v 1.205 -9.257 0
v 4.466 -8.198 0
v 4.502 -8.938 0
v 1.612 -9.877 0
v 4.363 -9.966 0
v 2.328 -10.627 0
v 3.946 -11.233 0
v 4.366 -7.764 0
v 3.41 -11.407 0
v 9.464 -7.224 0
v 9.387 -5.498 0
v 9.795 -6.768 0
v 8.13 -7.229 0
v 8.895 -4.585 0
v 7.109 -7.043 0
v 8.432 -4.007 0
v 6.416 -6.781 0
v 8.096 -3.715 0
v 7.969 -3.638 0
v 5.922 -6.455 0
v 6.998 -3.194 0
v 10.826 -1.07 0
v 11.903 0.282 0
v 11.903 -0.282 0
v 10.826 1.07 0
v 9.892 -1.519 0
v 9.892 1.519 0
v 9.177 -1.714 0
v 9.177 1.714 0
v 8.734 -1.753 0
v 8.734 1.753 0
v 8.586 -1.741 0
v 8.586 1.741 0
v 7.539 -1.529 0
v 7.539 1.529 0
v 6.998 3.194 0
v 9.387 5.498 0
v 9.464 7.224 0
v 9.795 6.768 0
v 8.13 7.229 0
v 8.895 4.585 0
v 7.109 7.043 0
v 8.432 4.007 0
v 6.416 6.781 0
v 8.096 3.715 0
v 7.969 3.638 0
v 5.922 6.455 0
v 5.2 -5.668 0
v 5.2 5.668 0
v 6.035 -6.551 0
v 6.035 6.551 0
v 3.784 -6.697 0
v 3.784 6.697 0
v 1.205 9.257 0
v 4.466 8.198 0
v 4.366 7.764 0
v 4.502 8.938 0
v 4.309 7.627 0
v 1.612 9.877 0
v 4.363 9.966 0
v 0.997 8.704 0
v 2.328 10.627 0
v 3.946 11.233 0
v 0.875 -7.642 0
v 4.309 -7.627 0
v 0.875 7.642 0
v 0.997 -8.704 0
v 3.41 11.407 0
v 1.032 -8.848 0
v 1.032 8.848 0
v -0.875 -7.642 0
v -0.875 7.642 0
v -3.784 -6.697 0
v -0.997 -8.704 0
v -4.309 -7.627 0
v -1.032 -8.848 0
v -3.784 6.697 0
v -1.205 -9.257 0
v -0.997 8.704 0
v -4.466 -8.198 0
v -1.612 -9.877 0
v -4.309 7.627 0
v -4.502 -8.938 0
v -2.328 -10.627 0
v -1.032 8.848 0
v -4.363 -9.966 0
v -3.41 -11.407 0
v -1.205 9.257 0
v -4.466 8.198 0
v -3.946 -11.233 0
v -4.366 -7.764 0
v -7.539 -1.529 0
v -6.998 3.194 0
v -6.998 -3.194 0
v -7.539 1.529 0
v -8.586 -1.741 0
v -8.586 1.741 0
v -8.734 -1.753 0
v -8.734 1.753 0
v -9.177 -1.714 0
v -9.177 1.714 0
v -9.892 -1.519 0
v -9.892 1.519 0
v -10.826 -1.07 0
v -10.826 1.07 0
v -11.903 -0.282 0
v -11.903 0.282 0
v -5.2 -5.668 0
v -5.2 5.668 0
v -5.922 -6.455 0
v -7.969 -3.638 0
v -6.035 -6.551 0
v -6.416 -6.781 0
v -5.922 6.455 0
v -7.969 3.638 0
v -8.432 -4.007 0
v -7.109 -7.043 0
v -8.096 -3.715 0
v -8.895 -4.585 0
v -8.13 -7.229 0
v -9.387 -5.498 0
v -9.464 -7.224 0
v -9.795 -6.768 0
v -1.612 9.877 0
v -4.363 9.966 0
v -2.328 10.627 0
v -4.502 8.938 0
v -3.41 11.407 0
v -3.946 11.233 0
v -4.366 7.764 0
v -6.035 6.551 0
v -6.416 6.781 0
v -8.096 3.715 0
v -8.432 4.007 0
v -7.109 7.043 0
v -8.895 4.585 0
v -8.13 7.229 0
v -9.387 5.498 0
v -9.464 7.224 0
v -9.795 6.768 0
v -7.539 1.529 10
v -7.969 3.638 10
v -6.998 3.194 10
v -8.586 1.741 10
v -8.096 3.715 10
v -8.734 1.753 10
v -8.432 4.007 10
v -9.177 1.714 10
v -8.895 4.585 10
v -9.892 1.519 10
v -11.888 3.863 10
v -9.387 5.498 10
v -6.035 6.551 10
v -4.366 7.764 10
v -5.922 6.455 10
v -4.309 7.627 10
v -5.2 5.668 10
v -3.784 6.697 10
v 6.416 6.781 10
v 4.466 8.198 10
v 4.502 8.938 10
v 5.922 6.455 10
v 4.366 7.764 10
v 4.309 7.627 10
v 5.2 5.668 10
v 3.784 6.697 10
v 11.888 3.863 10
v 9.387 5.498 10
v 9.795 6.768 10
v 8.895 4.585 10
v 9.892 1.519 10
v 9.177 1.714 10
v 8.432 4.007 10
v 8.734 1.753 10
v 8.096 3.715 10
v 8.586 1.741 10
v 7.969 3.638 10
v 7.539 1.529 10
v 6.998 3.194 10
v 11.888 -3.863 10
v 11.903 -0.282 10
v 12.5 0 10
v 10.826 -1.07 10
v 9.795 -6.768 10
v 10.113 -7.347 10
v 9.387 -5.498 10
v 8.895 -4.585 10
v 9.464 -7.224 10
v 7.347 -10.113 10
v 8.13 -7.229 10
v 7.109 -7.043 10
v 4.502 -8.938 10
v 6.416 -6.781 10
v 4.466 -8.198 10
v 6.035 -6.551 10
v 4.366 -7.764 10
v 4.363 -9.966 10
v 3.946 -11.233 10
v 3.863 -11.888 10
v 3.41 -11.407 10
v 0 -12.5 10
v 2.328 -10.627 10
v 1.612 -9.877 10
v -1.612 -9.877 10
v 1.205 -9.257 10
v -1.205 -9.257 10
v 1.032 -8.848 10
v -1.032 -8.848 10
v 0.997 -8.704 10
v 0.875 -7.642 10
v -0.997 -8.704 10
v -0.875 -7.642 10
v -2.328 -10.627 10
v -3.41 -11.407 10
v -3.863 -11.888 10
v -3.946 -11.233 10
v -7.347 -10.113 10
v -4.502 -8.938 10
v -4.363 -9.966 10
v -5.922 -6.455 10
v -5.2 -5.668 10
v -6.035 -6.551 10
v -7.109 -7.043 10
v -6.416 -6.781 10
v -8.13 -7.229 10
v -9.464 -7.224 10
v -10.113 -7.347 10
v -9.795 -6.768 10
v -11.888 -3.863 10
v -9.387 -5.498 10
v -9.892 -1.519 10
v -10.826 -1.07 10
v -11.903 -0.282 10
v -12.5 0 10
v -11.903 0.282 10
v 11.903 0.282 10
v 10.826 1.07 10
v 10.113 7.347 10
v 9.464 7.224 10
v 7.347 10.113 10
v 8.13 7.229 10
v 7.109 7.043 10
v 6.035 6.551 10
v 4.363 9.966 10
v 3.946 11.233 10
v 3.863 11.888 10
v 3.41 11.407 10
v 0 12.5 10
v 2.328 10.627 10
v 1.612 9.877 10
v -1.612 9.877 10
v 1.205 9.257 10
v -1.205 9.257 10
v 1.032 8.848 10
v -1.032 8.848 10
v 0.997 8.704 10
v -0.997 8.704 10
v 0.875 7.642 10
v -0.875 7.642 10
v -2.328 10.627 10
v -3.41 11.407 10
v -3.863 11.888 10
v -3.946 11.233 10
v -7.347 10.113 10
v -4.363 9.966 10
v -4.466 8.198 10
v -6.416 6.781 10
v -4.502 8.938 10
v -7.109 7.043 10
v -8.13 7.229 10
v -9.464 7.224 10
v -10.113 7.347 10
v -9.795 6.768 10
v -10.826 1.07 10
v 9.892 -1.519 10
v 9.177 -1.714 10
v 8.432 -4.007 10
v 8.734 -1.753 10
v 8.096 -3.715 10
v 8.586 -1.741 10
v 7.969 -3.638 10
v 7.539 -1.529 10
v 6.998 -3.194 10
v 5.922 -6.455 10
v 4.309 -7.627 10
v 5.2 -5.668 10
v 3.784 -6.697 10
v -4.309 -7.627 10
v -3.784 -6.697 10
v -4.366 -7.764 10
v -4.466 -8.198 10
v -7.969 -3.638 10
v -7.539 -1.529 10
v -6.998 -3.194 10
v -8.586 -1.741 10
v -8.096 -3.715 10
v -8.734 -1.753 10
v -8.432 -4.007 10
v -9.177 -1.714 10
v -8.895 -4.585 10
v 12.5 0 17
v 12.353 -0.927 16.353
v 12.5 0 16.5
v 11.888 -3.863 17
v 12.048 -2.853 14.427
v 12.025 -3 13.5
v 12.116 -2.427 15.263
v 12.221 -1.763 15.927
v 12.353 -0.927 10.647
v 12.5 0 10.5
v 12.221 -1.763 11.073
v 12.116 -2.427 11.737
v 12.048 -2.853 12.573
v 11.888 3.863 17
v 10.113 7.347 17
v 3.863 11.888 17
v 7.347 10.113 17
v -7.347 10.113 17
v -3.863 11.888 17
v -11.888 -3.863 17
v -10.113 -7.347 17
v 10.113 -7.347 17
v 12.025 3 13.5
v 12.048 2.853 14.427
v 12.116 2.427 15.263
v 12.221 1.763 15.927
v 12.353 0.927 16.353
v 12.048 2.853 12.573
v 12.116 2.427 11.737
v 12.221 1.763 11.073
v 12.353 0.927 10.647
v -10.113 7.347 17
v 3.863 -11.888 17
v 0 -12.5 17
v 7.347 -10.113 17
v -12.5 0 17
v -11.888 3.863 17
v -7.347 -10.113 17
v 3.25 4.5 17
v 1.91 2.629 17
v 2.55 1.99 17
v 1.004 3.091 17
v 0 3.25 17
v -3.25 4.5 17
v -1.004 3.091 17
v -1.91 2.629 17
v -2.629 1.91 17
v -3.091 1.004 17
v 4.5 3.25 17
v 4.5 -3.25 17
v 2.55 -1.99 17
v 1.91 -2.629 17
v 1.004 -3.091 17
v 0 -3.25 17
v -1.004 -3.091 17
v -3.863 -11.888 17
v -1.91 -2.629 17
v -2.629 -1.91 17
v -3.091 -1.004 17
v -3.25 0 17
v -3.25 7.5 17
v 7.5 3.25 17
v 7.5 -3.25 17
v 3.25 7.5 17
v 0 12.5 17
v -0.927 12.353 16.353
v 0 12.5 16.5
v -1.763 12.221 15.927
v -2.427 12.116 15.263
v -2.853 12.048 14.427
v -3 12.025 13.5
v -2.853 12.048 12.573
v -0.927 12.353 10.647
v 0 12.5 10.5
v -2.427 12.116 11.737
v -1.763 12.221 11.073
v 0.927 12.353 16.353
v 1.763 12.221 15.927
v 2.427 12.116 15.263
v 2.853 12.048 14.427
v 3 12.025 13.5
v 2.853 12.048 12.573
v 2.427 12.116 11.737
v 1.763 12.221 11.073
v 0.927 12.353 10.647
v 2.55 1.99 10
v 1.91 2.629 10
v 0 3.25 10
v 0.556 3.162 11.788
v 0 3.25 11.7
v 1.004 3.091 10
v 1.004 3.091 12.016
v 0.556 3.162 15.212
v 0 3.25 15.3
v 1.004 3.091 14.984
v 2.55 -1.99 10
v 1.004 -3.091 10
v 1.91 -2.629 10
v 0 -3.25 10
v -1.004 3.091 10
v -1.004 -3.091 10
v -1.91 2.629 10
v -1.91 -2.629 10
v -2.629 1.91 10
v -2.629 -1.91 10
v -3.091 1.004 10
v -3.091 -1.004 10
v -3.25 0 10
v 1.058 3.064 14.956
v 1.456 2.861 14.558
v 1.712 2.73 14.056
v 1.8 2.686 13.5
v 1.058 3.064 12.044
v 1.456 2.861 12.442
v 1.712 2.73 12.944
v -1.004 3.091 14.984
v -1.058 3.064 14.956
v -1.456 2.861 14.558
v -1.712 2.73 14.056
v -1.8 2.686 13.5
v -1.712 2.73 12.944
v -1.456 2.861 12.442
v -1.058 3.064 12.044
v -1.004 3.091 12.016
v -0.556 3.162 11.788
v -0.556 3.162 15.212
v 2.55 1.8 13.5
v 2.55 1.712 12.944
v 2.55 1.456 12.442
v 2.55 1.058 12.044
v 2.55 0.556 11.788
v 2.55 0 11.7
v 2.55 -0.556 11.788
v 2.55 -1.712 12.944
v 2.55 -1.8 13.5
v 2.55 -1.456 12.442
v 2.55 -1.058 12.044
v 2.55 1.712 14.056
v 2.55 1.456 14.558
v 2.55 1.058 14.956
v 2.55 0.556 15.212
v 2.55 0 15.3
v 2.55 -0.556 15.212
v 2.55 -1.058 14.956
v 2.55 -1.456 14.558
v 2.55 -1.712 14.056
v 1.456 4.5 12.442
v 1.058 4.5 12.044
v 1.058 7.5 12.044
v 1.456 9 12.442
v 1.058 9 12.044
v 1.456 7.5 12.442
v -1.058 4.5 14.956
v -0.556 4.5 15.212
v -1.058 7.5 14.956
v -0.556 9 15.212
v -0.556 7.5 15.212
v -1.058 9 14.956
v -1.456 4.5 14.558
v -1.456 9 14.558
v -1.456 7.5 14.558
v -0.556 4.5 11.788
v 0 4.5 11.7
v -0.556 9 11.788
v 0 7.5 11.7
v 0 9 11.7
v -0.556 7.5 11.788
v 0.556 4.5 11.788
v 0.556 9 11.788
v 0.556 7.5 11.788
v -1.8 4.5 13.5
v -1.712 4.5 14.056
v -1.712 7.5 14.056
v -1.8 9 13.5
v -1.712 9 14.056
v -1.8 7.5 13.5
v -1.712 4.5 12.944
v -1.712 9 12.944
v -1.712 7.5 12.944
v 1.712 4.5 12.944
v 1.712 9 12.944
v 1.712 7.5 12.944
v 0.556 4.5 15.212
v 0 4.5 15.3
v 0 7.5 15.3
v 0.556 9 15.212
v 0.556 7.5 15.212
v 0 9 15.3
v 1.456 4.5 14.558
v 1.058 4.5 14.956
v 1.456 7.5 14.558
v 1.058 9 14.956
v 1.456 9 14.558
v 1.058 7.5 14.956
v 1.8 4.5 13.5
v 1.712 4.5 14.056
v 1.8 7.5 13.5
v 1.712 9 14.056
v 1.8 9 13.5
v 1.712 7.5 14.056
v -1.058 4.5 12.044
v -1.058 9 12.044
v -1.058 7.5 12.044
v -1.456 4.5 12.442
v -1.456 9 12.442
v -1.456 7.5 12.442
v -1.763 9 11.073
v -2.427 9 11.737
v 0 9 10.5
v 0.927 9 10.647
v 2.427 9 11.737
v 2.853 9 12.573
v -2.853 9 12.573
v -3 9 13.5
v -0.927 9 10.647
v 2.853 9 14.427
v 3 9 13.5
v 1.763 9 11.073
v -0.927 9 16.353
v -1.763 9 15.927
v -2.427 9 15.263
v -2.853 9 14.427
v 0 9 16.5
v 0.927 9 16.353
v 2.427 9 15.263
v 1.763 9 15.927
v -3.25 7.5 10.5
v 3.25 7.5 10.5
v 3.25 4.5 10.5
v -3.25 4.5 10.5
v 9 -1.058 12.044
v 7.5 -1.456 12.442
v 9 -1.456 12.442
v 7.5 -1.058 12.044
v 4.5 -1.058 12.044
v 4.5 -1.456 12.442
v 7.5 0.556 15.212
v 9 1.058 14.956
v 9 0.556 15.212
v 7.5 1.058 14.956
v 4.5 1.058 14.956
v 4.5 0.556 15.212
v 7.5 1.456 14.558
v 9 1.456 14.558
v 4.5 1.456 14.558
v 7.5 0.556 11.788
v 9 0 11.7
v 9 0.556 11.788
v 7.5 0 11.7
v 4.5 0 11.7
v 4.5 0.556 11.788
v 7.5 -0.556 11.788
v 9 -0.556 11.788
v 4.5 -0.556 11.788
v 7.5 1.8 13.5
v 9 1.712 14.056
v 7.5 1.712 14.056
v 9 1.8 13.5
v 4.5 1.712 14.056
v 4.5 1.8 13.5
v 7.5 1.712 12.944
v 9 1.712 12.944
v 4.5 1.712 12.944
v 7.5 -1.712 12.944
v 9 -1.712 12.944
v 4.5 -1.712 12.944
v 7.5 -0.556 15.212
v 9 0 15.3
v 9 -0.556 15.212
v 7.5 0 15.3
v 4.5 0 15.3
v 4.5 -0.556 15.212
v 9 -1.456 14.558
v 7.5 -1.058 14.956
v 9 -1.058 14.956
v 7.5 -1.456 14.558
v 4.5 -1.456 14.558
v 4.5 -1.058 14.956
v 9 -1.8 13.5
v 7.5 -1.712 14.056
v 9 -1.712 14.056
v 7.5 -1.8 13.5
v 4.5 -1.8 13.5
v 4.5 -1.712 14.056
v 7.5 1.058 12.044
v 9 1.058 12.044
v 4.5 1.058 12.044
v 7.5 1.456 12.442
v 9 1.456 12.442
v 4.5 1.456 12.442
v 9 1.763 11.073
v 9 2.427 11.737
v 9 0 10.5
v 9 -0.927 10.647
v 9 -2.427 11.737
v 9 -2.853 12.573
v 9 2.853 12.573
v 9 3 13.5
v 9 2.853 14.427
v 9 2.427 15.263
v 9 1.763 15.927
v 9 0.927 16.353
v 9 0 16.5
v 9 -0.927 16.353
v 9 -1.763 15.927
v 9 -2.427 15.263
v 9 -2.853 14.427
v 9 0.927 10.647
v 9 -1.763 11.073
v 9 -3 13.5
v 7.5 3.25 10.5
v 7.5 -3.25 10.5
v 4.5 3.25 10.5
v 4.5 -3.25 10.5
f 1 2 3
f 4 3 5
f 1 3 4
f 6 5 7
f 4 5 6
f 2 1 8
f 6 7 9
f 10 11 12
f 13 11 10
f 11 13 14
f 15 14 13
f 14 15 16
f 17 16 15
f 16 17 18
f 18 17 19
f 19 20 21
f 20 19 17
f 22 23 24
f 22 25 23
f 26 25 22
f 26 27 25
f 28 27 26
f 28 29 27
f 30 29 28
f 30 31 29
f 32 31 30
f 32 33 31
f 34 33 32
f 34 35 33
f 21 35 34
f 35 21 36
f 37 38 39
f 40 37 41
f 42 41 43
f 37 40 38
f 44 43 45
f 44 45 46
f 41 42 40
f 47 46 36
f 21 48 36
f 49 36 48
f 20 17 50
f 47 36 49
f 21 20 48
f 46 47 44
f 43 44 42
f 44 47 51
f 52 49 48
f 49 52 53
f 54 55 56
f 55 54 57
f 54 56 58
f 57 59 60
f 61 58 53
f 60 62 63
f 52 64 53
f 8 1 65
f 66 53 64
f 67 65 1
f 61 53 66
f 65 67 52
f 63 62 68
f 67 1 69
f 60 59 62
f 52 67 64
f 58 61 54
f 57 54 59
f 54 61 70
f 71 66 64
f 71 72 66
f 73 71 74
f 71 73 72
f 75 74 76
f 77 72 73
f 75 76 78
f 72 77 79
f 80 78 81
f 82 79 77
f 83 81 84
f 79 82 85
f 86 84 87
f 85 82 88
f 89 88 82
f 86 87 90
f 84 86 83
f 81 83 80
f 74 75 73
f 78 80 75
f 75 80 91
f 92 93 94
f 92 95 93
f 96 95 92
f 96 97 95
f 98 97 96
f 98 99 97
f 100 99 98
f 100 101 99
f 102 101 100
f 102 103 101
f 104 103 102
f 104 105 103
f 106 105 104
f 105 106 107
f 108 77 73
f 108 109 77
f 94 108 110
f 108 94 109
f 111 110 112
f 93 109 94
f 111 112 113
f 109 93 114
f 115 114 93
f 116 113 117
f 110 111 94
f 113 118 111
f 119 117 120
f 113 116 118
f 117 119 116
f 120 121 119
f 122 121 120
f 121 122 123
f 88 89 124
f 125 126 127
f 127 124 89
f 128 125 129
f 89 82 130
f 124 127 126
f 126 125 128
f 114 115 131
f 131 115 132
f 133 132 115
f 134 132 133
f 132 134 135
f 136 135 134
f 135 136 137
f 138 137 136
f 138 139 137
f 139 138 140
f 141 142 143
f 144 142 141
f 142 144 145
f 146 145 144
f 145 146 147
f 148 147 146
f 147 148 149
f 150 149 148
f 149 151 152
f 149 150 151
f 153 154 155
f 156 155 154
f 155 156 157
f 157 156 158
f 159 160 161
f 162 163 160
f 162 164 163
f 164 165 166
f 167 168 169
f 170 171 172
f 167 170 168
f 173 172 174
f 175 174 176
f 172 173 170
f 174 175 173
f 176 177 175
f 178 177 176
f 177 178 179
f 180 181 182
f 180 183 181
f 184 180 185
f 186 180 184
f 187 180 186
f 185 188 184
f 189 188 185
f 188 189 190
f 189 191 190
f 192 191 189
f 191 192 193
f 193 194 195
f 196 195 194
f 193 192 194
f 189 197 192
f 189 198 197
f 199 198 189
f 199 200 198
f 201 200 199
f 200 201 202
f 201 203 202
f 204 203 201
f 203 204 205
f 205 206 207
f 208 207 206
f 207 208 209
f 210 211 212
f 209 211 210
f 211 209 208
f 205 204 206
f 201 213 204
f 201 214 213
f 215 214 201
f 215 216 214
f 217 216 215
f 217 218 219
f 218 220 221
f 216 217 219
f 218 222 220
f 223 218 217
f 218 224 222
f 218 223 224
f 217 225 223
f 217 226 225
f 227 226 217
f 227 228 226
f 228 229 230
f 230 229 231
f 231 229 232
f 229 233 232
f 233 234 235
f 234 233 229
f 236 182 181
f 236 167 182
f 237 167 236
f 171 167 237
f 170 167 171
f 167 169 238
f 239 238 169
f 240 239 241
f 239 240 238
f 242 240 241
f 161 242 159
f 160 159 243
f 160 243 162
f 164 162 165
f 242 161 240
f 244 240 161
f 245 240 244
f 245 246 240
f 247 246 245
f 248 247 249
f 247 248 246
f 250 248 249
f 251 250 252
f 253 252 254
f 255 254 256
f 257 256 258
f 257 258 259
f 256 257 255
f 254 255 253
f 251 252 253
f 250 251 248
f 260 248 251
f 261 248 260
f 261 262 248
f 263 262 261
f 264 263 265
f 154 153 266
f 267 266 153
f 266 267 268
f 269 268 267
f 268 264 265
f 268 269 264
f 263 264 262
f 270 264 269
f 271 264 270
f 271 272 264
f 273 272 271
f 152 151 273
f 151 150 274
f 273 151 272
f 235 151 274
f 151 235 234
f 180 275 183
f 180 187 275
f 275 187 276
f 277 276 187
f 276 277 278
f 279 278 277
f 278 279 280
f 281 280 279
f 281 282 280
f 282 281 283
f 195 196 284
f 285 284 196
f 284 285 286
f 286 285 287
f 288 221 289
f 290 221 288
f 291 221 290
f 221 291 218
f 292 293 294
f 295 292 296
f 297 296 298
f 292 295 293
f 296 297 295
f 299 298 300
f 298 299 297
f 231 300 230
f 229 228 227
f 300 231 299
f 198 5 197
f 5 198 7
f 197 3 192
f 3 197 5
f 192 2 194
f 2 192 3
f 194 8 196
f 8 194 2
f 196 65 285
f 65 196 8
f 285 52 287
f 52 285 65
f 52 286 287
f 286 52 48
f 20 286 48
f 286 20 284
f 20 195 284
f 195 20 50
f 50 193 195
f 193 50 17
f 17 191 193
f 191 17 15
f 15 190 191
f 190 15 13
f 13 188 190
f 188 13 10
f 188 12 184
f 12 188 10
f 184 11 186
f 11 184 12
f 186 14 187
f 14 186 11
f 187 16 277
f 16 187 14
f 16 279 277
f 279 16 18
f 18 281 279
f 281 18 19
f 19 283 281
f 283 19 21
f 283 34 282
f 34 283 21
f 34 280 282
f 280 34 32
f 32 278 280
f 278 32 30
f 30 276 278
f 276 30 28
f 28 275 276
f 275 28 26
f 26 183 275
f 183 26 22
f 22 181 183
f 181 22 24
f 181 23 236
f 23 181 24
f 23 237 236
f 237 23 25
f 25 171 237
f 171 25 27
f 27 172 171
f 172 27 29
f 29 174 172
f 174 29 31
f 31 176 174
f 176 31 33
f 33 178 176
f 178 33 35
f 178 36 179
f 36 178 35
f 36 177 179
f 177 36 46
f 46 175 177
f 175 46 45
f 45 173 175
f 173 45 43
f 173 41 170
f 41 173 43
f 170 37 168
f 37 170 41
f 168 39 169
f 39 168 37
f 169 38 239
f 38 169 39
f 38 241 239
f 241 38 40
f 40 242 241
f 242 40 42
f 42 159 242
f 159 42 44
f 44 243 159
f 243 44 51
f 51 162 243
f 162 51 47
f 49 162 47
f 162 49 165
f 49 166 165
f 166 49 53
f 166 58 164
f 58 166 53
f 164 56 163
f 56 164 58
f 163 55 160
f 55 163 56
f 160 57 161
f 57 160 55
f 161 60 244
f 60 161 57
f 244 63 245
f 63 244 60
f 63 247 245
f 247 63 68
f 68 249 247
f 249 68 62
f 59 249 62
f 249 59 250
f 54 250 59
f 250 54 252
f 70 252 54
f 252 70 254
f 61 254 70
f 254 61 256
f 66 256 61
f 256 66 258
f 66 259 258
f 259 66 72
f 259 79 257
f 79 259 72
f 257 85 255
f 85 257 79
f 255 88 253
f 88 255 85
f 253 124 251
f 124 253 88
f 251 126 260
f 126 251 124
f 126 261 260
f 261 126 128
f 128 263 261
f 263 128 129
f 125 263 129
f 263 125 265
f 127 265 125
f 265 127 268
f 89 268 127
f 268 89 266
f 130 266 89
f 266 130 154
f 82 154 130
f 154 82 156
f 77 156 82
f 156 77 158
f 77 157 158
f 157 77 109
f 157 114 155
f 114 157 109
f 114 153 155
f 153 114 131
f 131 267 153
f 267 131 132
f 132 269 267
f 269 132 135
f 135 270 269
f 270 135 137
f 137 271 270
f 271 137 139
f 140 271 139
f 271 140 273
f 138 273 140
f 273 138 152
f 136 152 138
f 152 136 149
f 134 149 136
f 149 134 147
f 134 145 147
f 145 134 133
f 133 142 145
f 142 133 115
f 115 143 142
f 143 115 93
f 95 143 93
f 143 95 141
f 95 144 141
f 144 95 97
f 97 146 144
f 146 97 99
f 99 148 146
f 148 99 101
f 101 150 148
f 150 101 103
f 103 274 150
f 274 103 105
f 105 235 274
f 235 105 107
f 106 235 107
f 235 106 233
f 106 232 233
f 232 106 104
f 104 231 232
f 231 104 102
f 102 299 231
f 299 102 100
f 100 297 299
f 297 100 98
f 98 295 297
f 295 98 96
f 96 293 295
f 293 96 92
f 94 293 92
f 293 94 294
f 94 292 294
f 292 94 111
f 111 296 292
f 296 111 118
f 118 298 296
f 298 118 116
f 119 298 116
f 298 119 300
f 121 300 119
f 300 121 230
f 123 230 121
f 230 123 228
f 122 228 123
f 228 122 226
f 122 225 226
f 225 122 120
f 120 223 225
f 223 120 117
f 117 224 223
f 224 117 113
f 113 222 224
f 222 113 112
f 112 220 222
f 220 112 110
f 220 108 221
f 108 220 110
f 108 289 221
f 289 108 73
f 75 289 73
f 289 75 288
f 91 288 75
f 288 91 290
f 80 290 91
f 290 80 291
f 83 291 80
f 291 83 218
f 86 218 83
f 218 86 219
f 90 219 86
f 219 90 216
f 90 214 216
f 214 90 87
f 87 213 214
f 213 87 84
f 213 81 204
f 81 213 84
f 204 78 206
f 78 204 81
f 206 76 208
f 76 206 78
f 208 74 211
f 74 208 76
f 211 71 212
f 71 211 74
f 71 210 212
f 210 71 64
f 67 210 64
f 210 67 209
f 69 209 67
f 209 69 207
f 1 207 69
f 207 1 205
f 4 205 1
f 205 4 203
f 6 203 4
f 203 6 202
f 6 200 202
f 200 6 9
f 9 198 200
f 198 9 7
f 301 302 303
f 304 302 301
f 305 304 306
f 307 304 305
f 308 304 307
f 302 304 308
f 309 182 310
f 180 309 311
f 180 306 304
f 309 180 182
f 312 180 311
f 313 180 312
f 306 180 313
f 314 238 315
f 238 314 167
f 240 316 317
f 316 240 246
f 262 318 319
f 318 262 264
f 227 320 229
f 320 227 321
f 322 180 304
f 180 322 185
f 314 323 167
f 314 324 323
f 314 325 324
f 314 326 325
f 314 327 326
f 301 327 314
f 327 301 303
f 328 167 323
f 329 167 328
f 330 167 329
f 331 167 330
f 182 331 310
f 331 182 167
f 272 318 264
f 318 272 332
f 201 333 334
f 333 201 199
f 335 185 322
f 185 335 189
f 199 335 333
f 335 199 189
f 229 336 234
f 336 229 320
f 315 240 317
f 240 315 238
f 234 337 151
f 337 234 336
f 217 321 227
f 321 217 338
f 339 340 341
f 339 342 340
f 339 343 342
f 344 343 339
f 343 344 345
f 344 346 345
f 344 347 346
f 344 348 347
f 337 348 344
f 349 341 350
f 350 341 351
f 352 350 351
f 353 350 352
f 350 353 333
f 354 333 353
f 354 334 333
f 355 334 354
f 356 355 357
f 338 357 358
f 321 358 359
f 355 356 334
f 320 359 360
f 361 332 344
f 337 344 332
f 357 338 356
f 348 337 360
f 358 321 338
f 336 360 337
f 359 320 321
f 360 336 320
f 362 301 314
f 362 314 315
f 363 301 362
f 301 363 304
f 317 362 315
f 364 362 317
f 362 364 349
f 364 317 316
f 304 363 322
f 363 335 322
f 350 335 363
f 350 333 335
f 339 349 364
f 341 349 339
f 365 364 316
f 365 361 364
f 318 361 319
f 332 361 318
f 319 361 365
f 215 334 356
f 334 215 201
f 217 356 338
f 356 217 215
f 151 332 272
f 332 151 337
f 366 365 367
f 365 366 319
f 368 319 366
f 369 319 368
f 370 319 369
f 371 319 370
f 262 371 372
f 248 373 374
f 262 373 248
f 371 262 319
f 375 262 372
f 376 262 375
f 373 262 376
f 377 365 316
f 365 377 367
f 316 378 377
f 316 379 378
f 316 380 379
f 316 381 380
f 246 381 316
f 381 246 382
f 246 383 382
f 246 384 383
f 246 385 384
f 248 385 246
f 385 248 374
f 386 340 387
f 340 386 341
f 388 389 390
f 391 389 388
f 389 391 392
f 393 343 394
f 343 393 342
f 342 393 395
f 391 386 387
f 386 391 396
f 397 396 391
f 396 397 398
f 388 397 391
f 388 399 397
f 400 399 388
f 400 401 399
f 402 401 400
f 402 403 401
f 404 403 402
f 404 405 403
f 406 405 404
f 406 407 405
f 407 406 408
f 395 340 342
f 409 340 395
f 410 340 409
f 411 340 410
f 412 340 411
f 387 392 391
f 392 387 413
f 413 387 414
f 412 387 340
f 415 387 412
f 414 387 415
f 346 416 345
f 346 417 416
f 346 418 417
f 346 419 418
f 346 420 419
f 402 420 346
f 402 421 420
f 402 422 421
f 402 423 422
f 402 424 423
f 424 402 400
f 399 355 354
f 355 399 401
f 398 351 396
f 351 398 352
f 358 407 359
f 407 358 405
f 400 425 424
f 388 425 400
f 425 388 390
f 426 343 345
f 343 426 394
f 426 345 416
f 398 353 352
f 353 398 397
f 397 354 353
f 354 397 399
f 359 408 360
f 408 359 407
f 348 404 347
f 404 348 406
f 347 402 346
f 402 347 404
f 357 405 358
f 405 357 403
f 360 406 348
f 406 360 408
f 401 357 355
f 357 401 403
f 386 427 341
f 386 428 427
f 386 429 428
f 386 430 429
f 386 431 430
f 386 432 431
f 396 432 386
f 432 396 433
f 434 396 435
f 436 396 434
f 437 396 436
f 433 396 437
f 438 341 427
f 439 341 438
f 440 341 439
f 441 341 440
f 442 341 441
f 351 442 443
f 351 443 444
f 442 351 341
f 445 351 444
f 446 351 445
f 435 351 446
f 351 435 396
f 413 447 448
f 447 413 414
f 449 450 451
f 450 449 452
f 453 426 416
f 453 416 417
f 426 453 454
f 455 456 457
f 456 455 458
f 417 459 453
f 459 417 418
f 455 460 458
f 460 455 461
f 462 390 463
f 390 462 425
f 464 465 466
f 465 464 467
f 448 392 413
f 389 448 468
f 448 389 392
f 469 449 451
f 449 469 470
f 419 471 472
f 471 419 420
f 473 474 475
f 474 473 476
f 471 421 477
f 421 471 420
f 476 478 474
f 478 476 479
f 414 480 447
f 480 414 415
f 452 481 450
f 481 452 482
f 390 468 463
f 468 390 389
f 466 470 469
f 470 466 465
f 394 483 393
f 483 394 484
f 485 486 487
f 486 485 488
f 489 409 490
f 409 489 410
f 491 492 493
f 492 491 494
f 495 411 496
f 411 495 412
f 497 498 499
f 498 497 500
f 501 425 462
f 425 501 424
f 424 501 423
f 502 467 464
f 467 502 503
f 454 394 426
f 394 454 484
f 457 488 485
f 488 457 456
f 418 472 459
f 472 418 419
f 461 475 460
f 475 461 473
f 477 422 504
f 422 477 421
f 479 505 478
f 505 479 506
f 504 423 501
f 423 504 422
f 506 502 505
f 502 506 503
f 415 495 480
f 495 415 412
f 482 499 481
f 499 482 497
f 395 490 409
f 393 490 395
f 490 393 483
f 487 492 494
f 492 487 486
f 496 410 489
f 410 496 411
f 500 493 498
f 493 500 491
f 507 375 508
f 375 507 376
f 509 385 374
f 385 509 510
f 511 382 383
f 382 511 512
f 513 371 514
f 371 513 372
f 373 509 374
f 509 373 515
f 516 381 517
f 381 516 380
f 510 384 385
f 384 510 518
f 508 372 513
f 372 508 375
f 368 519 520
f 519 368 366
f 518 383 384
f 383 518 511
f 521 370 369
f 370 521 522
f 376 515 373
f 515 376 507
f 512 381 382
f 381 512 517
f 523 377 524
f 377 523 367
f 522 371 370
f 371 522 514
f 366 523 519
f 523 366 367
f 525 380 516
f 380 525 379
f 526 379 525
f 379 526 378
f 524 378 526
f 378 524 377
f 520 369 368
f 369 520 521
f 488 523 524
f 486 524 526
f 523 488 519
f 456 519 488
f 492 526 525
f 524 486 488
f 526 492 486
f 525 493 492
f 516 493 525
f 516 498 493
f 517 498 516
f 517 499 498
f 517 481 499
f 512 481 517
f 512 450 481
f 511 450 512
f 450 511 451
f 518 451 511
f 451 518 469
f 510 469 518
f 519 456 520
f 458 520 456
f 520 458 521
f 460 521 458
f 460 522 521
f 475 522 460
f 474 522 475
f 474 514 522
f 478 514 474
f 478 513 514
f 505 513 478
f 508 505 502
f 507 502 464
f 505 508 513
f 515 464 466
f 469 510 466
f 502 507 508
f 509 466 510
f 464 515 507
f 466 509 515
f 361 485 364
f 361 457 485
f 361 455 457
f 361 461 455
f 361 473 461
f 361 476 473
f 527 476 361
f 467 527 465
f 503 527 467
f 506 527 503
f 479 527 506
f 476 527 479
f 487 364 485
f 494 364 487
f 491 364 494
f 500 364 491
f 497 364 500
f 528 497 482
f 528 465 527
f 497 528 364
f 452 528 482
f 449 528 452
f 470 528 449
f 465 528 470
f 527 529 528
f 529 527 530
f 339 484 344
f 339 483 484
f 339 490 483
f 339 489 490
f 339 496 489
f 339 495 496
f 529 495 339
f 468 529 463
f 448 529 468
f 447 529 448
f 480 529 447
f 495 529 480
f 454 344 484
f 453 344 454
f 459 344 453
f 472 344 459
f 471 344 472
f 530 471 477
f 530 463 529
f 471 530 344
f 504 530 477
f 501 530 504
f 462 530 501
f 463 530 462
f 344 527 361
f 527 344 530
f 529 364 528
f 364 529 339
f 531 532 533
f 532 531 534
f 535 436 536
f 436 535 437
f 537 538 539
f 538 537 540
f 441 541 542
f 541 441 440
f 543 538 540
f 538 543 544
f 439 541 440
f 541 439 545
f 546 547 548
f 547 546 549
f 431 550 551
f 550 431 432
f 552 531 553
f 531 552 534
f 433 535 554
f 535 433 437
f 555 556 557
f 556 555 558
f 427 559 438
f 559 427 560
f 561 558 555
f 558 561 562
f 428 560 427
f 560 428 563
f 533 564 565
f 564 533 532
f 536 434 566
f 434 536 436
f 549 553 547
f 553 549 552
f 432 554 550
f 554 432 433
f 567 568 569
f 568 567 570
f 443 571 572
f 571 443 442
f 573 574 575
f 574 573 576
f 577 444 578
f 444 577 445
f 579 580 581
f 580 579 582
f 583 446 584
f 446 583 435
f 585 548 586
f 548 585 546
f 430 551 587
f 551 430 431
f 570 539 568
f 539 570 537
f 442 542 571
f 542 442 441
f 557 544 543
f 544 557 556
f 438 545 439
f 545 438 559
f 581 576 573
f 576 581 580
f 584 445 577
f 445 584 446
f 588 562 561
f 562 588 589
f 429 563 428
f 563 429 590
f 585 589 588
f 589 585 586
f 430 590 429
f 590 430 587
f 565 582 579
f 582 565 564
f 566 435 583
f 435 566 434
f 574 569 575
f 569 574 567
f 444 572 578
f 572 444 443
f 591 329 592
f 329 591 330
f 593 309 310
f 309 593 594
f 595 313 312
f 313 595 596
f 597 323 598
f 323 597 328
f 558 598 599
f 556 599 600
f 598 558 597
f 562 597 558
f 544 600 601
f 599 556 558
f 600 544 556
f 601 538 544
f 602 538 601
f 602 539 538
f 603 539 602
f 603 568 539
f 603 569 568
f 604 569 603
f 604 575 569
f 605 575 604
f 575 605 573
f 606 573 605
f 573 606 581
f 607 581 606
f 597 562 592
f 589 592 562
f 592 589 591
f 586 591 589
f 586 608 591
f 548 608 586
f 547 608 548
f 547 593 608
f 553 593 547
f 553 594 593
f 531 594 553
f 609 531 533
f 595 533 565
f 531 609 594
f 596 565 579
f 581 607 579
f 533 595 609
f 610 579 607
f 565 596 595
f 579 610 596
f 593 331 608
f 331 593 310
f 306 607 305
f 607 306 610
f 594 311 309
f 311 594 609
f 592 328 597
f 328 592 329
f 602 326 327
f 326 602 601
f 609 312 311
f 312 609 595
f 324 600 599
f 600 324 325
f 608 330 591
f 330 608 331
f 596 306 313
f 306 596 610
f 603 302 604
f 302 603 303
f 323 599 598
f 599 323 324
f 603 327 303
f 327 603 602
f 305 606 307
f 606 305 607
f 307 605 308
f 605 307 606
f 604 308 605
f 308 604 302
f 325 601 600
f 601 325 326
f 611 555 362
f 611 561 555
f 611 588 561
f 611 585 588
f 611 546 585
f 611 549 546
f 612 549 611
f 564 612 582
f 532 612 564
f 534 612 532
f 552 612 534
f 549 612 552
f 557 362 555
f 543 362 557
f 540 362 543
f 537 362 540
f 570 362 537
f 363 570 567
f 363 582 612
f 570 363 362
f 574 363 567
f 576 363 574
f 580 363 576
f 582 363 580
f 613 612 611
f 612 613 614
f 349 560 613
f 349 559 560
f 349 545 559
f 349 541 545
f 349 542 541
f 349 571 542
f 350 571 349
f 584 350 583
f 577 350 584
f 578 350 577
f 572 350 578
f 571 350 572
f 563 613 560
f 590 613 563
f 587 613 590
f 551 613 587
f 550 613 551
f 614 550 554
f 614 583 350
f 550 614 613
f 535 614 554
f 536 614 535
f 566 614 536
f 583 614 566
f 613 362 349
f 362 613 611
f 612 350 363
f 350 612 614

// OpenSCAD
// file: 12vmotor.scad
module dshaft(d = 6, dee = 0.7, h = 5.8){
    difference() {
    cylinder(r=d/2, h=h, center=true);
        translate([d + d/2 - dee,0,0])
        cube([d*2,d*2,h*2], center=true);
    }
}

module gmshaft_disp() {
    translate([8,0,0]) children();
}
module 12vmotor(neg = false) {
    
cylinder(r=38.5/2,h=25);
cylinder(r=34.5/2,h=53);
cylinder(r=11/2,h=56.5);
translate([10,0,55])    
    cube ([1,3,10], center=true);
translate([-10,0,55])    
    cube ([1,3,10], center=true);
if (neg) {
    cylinder(r=34.5/2,h=65);
    translate([0,0,1])
    rotate(180,[0,1,0])
            cylinder(r=32/2,h=12);
    
    translate([0,0,-3])
    rotate(180,[0,1,0])
            cylinder(r=45/2,h=24);

}
gmshaft_disp()
rotate(180,[0,1,0])
union() {
    cylinder(r=12/2,h=6);
    //cylinder(r=6/2,h=15);
translate([0,0,15/2])
        dshaft(h=15);
}
}

12vmotor(neg = true);
// main file
include <MCAD/involute_gears.scad>;
//include <18mmshaftsettings.scad>
use <12vmotor.scad>

shaft_diameter = 18;
shaft_height = 200;
//$fn=100;
		
     
//pi=3.14;
in=25.4;
dia=2.5*in;
ratio=1/3;

N=30;
N2=floor(N*ratio);

//translate([0,0,30])
//cylinder(r=dia/2, h=1);

OD=dia;
    
P=(N+2)/OD;
p=180/P;

OD2=(N2+2)/P;
t=10;

biggear_height = t+10;
biggear_diameter = OD;

littlegear_height = t+7;
littlegear_diameter = OD2;
    washer=1;
    washer_w=2;

module biggear() {
translate([0,0,washer])
difference(){
    gear (
			number_of_teeth =N,
			circular_pitch=p,
			gear_thickness = t,
			rim_thickness = t,
			rim_width = 1,
			hub_thickness = t+10,
			hub_diameter=30,
			bore_diameter=shaft_diameter,
			backlash = 1,
			circles=0);
            

translate([0,0,t+5])
rotate(90,[0,1,0])
cylinder(r=2.5,h=100,center=true);
}
}

//biggear();

module littlegear() {
    
setscrew_z=13.5;
    
//rotate(360/N2/2,[0,0,1])
difference(){
 gear (
			number_of_teeth =N2,
			circular_pitch=p,
			gear_thickness = t,
			rim_thickness = t,
			rim_width = 1,
			hub_thickness = t+7,
			hub_diameter=25,
			bore_diameter=0,
			backlash = 0,
			circles=0
            );
    
translate([0,0,setscrew_z])
rotate(90,[0,1,0])
translate([0,0,50])
cylinder(r=1.8,h=100,center=true);
    
translate([0,0,setscrew_z])
rotate(90,[0,1,0])
translate([0,0,50+9])
cylinder(r=3,h=100,center=true);

translate([6,0,10+t+.5])
    cube([3,6.5,20], center=true);

translate([0,0,t+7+5-7])
dshaft(d=6.5,h=10);

rotate(90, [0,0,1]) {
translate([0,0,setscrew_z])
rotate(90,[0,1,0])
translate([0,0,50])
cylinder(r=1.8,h=100,center=true);

translate([0,0,setscrew_z])
rotate(90,[0,1,0])
translate([0,0,50+9])
cylinder(r=3,h=100,center=true);
translate([6,0,10+t+.5])
    cube([3,6.5,20], center=true);
    

}
}

}


module biggearvol(neg = false) {
    neg_factor=1.1;
    $fn=30;
    if (neg) {
        difference() {
        //translate([0,0,-washer])
        cylinder (r=biggear_diameter/2*neg_factor, h = biggear_height+washer*2);
        translate([0,0,biggear_height+washer])
        cylinder (r1=shaft_diameter/2+washer_w, r2=shaft_diameter/2+washer_w+(washer_w*2), h = washer*2);
        translate([0,0,-washer])
        cylinder (r2=shaft_diameter/2+washer_w, r1=shaft_diameter/2+washer_w+(washer_w*2), h = washer*2);
       /*
        minkowski() {
            hull()
                biggear();
            cylinder(r=2, h=.5, center=true, $fn=10);
        }
        */
        }
    }
    else biggear();
}
//biggearvol(neg=true);

module littlegearvol(neg = false) {
    $fn=20;
    neg_factor=1.5;
    neg_factor_z=1.1;
    
     if (neg) {
         translate([0,0,-((littlegear_height*neg_factor_z)-littlegear_height)/2])
        cylinder (r=littlegear_diameter/2*neg_factor, h = littlegear_height*neg_factor_z);
         
         /*
       minkowski() {
            hull()
                littlegear();
             cylinder(r=4, h=.5, center=true, $fn=10);
        }
         */
    }
    else littlegear();
}

//translate([45,0,t+6])

//rotate(180,[1,0,0])
littlegearvol(neg=false);
%littlegearvol(neg=true);

//biggearvol(neg=false);
//%biggearvol(neg=true);
